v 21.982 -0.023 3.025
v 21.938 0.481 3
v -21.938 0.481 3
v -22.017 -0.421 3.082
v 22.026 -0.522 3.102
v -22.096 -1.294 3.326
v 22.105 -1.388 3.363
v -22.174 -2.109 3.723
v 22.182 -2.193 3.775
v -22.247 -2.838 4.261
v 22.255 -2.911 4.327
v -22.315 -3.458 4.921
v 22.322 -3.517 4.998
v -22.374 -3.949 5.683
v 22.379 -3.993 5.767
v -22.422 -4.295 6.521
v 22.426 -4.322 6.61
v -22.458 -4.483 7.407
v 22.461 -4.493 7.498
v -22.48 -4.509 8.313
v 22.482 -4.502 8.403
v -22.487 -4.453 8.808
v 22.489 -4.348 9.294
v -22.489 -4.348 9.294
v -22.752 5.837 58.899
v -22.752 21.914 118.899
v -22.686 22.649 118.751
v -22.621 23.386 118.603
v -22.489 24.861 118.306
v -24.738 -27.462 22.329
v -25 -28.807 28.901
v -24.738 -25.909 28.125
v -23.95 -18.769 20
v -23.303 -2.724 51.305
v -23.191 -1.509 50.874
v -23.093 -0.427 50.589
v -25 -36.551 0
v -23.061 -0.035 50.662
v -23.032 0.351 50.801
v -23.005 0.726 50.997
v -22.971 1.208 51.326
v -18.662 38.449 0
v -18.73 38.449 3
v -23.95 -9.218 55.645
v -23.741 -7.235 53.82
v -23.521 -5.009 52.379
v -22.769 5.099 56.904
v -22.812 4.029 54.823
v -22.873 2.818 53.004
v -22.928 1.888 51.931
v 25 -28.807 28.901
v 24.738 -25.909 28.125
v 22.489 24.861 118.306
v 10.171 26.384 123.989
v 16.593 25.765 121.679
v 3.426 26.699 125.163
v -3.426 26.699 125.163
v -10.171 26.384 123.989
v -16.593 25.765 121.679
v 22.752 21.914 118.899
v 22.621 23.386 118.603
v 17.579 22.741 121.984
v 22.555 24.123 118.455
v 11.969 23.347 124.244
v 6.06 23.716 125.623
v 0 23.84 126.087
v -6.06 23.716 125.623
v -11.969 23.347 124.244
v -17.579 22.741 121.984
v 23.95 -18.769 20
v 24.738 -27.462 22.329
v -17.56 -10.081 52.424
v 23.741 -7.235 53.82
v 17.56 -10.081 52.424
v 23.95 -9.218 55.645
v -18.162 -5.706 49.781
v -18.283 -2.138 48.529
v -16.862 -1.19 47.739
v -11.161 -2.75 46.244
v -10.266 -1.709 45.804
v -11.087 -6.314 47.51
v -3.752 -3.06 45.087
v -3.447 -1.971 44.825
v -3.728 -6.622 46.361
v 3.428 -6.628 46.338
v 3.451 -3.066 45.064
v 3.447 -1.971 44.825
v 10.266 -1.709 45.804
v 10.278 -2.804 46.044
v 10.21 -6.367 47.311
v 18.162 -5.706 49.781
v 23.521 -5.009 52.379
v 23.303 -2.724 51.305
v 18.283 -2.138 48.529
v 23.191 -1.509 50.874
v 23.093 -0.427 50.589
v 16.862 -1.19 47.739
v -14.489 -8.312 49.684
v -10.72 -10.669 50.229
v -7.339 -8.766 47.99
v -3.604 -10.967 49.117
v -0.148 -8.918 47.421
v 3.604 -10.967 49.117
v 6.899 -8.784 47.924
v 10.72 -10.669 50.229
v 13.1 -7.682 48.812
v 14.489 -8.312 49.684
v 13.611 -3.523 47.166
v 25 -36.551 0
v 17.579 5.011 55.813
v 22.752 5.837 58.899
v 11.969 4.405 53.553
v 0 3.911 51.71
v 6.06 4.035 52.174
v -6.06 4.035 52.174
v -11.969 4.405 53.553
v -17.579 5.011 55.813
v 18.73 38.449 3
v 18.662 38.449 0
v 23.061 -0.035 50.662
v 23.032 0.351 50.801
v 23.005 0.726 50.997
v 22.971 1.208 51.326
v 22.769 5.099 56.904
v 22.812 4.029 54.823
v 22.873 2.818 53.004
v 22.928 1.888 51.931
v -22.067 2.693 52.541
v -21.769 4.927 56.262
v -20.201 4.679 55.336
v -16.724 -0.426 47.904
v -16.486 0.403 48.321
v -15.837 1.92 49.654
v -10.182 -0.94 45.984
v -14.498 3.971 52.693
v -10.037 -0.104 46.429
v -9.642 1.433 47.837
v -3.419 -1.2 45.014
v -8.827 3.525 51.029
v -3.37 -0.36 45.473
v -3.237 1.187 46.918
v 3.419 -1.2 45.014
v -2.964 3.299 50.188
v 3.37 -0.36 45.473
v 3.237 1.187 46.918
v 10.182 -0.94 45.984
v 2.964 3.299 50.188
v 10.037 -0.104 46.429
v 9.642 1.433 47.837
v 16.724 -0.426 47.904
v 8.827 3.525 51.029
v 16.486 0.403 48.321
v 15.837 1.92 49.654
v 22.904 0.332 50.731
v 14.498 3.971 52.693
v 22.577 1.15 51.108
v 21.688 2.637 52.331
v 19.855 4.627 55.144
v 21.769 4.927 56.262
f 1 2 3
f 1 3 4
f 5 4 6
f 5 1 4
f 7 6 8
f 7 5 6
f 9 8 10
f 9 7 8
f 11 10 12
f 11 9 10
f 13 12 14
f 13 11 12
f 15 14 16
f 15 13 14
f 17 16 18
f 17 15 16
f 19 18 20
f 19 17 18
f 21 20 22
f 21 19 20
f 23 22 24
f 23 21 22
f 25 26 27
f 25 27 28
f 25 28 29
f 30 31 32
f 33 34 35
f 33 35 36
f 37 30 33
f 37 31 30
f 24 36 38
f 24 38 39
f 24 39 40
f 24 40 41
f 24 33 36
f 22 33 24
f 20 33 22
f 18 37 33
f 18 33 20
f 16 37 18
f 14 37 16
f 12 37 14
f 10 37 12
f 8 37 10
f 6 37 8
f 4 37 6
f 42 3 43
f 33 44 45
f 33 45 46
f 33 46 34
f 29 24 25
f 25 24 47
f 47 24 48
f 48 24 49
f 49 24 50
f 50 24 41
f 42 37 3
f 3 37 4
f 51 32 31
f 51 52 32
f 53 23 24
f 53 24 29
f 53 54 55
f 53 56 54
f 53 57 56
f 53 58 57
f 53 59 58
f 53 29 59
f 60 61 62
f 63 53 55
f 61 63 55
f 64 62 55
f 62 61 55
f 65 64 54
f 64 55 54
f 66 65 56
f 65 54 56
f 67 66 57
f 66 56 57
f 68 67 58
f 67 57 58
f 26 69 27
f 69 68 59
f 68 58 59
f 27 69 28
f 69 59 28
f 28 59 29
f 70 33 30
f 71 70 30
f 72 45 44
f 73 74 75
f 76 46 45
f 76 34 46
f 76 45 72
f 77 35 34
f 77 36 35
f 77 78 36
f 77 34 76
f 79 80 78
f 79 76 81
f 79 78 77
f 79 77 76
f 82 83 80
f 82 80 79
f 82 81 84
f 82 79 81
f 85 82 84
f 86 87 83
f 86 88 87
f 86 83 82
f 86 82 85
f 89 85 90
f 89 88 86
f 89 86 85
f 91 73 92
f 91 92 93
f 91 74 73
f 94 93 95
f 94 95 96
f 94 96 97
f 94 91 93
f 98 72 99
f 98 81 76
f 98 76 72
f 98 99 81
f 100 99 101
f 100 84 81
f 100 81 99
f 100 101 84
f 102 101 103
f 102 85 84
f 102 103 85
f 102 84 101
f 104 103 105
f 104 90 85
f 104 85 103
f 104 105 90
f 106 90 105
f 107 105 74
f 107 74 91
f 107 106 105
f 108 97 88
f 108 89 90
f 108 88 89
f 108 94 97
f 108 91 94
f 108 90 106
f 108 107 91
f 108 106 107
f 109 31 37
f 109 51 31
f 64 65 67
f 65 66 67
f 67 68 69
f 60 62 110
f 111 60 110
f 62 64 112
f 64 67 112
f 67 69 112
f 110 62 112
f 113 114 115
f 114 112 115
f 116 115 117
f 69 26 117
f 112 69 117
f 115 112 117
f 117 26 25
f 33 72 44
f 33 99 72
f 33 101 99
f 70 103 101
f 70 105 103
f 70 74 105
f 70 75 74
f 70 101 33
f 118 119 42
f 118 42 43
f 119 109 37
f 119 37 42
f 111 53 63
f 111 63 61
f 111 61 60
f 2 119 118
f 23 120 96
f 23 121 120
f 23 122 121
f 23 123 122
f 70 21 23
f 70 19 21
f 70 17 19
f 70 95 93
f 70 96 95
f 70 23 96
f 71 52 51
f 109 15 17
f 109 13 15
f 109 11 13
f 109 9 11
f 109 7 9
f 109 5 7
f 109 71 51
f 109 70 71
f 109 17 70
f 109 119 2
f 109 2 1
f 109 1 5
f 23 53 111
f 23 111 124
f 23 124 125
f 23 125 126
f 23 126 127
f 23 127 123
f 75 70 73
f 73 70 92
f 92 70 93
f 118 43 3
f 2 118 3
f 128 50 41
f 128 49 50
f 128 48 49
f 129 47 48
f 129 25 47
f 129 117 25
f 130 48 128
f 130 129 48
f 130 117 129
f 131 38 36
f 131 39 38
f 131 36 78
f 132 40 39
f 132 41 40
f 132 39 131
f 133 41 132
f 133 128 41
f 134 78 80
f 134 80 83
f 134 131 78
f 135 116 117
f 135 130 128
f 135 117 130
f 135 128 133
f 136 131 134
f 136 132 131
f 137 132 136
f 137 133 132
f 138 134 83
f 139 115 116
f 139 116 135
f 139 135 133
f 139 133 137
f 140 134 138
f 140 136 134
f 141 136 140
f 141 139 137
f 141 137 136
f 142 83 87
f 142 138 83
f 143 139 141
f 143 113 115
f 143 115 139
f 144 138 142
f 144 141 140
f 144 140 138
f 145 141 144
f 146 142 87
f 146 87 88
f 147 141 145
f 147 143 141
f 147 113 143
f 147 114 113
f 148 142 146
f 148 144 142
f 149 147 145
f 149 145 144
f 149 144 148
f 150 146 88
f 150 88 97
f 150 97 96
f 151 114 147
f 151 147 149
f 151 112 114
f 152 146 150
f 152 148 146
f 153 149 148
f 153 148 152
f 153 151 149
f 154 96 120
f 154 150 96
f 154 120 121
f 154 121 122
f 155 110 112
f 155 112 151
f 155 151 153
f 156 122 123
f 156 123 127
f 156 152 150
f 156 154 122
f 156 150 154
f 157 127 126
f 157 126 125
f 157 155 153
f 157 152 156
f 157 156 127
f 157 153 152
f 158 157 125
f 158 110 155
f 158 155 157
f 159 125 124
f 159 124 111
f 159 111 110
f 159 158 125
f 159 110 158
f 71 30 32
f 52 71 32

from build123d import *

# Parameters (mm, degrees)
F1_DEPTH = 25
F5_DEPTH = 16.7
F8_DEPTH = 141.2028865991


with BuildPart() as f1:
    # F0 (on Right) → F1 (new body, symmetric)
    with BuildSketch(Plane.YZ):
        with BuildLine():
            Line((-36.5510998701, 0), (38.4489001299, 0))
            Line((38.4489001299, 0), (38.4489001299, 3))
            Line((38.4489001299, 3), (0.4813009491, 3))
            ThreePointArc((0.4813009491, 3), (-3.4854657523, 4.956192855), (-4.3483281823, 9.2940952255))
            Line((-4.3483281823, 9.2940952255), (28.8086734224, 133.0377098409))
            Line((28.8086734224, 133.0377098409), (12.6777121234, 137.3599878941))
            Line((12.6777121234, 137.3599878941), (-18.7688018566, 20))
            Line((-18.7688018566, 20), (-27.4621342932, 22.3293714059))
            Line((-27.4621342932, 22.3293714059), (-25.9092200226, 28.1249263637))
            Line((-25.9092200226, 28.1249263637), (-28.8069975014, 28.901383499))
            Line((-28.8069975014, 28.901383499), (-36.5510998701, 0))
        make_face()
    extrude(amount=F1_DEPTH, both=True)

    # F2 (on Right) → F3 (revolve, cut)
    with BuildSketch(Plane.YZ):
        with BuildLine():
            Line((12.2894835557, 135.9110991547), (0.6426265261, 92.4444369717))
            Line((0.6426265261, 92.4444369717), (13.8758103463, 88.8986160538))
            Line((13.8758103463, 88.8986160538), (23.8403435827, 126.0867603659))
            add(Edge.make_bspline(
                [(22.2214309345, 135.113339), (24.3902161666, 133.5995613693), (24.376132241, 128.0570148586), (23.8403435827, 126.0867603659)],
                knots=[0, 0, 0, 0, 9.1706052145, 9.1706052145, 9.1706052145, 9.1706052145], degree=3))
            add(Edge.make_bspline(
                [(12.2894835557, 135.9110991547), (16.0249762186, 136.7180167793), (20.3704343359, 135.803547418), (22.2214309345, 135.113339)],
                knots=[0, 0, 0, 0, 9.9639349657, 9.9639349657, 9.9639349657, 9.9639349657], degree=3))
        make_face()
    revolve(axis=Axis((0, 7.2592184362, 90.6715265127), (0, -0.9659258263, 0.2588190451)), mode=Mode.SUBTRACT)

    # F4 (on face) → F5 (cut, through all)
    with BuildSketch(Plane(origin=(0, -6.3805692325, 1.7096683731), x_dir=(-1, 0, 0), z_dir=(0, 0.9659258263, -0.2588190451))):
        with BuildLine():
            ThreePointArc((-25, 118.7396250955), (0, 127.9607931515), (25, 118.7396250955))
            Line((25, 118.7396250955), (25, 135.9607931515))
            Line((25, 135.9607931515), (-25, 135.9607931515))
            Line((-25, 135.9607931515), (-25, 118.7396250955))
        make_face()
    extrude(amount=-F5_DEPTH, mode=Mode.SUBTRACT)

    # F7 (on face) → F8 (cut, through all)
    with BuildSketch(Plane(origin=(0, -2.4484594232, -9.1377749675), x_dir=(1, 0, 0), z_dir=(0, 0.2588190451, 0.9659258263))):
        Polygon((-25, 37.1387856279), (-25, -35.3056513438), (-18.6619330295, 37.1387856279), align=None)
        Polygon((18.6619330295, 37.1387856279), (25, -35.3056513438), (25, 37.1387856279), align=None)
    extrude(amount=F8_DEPTH, mode=Mode.SUBTRACT)


solid = f1.part
